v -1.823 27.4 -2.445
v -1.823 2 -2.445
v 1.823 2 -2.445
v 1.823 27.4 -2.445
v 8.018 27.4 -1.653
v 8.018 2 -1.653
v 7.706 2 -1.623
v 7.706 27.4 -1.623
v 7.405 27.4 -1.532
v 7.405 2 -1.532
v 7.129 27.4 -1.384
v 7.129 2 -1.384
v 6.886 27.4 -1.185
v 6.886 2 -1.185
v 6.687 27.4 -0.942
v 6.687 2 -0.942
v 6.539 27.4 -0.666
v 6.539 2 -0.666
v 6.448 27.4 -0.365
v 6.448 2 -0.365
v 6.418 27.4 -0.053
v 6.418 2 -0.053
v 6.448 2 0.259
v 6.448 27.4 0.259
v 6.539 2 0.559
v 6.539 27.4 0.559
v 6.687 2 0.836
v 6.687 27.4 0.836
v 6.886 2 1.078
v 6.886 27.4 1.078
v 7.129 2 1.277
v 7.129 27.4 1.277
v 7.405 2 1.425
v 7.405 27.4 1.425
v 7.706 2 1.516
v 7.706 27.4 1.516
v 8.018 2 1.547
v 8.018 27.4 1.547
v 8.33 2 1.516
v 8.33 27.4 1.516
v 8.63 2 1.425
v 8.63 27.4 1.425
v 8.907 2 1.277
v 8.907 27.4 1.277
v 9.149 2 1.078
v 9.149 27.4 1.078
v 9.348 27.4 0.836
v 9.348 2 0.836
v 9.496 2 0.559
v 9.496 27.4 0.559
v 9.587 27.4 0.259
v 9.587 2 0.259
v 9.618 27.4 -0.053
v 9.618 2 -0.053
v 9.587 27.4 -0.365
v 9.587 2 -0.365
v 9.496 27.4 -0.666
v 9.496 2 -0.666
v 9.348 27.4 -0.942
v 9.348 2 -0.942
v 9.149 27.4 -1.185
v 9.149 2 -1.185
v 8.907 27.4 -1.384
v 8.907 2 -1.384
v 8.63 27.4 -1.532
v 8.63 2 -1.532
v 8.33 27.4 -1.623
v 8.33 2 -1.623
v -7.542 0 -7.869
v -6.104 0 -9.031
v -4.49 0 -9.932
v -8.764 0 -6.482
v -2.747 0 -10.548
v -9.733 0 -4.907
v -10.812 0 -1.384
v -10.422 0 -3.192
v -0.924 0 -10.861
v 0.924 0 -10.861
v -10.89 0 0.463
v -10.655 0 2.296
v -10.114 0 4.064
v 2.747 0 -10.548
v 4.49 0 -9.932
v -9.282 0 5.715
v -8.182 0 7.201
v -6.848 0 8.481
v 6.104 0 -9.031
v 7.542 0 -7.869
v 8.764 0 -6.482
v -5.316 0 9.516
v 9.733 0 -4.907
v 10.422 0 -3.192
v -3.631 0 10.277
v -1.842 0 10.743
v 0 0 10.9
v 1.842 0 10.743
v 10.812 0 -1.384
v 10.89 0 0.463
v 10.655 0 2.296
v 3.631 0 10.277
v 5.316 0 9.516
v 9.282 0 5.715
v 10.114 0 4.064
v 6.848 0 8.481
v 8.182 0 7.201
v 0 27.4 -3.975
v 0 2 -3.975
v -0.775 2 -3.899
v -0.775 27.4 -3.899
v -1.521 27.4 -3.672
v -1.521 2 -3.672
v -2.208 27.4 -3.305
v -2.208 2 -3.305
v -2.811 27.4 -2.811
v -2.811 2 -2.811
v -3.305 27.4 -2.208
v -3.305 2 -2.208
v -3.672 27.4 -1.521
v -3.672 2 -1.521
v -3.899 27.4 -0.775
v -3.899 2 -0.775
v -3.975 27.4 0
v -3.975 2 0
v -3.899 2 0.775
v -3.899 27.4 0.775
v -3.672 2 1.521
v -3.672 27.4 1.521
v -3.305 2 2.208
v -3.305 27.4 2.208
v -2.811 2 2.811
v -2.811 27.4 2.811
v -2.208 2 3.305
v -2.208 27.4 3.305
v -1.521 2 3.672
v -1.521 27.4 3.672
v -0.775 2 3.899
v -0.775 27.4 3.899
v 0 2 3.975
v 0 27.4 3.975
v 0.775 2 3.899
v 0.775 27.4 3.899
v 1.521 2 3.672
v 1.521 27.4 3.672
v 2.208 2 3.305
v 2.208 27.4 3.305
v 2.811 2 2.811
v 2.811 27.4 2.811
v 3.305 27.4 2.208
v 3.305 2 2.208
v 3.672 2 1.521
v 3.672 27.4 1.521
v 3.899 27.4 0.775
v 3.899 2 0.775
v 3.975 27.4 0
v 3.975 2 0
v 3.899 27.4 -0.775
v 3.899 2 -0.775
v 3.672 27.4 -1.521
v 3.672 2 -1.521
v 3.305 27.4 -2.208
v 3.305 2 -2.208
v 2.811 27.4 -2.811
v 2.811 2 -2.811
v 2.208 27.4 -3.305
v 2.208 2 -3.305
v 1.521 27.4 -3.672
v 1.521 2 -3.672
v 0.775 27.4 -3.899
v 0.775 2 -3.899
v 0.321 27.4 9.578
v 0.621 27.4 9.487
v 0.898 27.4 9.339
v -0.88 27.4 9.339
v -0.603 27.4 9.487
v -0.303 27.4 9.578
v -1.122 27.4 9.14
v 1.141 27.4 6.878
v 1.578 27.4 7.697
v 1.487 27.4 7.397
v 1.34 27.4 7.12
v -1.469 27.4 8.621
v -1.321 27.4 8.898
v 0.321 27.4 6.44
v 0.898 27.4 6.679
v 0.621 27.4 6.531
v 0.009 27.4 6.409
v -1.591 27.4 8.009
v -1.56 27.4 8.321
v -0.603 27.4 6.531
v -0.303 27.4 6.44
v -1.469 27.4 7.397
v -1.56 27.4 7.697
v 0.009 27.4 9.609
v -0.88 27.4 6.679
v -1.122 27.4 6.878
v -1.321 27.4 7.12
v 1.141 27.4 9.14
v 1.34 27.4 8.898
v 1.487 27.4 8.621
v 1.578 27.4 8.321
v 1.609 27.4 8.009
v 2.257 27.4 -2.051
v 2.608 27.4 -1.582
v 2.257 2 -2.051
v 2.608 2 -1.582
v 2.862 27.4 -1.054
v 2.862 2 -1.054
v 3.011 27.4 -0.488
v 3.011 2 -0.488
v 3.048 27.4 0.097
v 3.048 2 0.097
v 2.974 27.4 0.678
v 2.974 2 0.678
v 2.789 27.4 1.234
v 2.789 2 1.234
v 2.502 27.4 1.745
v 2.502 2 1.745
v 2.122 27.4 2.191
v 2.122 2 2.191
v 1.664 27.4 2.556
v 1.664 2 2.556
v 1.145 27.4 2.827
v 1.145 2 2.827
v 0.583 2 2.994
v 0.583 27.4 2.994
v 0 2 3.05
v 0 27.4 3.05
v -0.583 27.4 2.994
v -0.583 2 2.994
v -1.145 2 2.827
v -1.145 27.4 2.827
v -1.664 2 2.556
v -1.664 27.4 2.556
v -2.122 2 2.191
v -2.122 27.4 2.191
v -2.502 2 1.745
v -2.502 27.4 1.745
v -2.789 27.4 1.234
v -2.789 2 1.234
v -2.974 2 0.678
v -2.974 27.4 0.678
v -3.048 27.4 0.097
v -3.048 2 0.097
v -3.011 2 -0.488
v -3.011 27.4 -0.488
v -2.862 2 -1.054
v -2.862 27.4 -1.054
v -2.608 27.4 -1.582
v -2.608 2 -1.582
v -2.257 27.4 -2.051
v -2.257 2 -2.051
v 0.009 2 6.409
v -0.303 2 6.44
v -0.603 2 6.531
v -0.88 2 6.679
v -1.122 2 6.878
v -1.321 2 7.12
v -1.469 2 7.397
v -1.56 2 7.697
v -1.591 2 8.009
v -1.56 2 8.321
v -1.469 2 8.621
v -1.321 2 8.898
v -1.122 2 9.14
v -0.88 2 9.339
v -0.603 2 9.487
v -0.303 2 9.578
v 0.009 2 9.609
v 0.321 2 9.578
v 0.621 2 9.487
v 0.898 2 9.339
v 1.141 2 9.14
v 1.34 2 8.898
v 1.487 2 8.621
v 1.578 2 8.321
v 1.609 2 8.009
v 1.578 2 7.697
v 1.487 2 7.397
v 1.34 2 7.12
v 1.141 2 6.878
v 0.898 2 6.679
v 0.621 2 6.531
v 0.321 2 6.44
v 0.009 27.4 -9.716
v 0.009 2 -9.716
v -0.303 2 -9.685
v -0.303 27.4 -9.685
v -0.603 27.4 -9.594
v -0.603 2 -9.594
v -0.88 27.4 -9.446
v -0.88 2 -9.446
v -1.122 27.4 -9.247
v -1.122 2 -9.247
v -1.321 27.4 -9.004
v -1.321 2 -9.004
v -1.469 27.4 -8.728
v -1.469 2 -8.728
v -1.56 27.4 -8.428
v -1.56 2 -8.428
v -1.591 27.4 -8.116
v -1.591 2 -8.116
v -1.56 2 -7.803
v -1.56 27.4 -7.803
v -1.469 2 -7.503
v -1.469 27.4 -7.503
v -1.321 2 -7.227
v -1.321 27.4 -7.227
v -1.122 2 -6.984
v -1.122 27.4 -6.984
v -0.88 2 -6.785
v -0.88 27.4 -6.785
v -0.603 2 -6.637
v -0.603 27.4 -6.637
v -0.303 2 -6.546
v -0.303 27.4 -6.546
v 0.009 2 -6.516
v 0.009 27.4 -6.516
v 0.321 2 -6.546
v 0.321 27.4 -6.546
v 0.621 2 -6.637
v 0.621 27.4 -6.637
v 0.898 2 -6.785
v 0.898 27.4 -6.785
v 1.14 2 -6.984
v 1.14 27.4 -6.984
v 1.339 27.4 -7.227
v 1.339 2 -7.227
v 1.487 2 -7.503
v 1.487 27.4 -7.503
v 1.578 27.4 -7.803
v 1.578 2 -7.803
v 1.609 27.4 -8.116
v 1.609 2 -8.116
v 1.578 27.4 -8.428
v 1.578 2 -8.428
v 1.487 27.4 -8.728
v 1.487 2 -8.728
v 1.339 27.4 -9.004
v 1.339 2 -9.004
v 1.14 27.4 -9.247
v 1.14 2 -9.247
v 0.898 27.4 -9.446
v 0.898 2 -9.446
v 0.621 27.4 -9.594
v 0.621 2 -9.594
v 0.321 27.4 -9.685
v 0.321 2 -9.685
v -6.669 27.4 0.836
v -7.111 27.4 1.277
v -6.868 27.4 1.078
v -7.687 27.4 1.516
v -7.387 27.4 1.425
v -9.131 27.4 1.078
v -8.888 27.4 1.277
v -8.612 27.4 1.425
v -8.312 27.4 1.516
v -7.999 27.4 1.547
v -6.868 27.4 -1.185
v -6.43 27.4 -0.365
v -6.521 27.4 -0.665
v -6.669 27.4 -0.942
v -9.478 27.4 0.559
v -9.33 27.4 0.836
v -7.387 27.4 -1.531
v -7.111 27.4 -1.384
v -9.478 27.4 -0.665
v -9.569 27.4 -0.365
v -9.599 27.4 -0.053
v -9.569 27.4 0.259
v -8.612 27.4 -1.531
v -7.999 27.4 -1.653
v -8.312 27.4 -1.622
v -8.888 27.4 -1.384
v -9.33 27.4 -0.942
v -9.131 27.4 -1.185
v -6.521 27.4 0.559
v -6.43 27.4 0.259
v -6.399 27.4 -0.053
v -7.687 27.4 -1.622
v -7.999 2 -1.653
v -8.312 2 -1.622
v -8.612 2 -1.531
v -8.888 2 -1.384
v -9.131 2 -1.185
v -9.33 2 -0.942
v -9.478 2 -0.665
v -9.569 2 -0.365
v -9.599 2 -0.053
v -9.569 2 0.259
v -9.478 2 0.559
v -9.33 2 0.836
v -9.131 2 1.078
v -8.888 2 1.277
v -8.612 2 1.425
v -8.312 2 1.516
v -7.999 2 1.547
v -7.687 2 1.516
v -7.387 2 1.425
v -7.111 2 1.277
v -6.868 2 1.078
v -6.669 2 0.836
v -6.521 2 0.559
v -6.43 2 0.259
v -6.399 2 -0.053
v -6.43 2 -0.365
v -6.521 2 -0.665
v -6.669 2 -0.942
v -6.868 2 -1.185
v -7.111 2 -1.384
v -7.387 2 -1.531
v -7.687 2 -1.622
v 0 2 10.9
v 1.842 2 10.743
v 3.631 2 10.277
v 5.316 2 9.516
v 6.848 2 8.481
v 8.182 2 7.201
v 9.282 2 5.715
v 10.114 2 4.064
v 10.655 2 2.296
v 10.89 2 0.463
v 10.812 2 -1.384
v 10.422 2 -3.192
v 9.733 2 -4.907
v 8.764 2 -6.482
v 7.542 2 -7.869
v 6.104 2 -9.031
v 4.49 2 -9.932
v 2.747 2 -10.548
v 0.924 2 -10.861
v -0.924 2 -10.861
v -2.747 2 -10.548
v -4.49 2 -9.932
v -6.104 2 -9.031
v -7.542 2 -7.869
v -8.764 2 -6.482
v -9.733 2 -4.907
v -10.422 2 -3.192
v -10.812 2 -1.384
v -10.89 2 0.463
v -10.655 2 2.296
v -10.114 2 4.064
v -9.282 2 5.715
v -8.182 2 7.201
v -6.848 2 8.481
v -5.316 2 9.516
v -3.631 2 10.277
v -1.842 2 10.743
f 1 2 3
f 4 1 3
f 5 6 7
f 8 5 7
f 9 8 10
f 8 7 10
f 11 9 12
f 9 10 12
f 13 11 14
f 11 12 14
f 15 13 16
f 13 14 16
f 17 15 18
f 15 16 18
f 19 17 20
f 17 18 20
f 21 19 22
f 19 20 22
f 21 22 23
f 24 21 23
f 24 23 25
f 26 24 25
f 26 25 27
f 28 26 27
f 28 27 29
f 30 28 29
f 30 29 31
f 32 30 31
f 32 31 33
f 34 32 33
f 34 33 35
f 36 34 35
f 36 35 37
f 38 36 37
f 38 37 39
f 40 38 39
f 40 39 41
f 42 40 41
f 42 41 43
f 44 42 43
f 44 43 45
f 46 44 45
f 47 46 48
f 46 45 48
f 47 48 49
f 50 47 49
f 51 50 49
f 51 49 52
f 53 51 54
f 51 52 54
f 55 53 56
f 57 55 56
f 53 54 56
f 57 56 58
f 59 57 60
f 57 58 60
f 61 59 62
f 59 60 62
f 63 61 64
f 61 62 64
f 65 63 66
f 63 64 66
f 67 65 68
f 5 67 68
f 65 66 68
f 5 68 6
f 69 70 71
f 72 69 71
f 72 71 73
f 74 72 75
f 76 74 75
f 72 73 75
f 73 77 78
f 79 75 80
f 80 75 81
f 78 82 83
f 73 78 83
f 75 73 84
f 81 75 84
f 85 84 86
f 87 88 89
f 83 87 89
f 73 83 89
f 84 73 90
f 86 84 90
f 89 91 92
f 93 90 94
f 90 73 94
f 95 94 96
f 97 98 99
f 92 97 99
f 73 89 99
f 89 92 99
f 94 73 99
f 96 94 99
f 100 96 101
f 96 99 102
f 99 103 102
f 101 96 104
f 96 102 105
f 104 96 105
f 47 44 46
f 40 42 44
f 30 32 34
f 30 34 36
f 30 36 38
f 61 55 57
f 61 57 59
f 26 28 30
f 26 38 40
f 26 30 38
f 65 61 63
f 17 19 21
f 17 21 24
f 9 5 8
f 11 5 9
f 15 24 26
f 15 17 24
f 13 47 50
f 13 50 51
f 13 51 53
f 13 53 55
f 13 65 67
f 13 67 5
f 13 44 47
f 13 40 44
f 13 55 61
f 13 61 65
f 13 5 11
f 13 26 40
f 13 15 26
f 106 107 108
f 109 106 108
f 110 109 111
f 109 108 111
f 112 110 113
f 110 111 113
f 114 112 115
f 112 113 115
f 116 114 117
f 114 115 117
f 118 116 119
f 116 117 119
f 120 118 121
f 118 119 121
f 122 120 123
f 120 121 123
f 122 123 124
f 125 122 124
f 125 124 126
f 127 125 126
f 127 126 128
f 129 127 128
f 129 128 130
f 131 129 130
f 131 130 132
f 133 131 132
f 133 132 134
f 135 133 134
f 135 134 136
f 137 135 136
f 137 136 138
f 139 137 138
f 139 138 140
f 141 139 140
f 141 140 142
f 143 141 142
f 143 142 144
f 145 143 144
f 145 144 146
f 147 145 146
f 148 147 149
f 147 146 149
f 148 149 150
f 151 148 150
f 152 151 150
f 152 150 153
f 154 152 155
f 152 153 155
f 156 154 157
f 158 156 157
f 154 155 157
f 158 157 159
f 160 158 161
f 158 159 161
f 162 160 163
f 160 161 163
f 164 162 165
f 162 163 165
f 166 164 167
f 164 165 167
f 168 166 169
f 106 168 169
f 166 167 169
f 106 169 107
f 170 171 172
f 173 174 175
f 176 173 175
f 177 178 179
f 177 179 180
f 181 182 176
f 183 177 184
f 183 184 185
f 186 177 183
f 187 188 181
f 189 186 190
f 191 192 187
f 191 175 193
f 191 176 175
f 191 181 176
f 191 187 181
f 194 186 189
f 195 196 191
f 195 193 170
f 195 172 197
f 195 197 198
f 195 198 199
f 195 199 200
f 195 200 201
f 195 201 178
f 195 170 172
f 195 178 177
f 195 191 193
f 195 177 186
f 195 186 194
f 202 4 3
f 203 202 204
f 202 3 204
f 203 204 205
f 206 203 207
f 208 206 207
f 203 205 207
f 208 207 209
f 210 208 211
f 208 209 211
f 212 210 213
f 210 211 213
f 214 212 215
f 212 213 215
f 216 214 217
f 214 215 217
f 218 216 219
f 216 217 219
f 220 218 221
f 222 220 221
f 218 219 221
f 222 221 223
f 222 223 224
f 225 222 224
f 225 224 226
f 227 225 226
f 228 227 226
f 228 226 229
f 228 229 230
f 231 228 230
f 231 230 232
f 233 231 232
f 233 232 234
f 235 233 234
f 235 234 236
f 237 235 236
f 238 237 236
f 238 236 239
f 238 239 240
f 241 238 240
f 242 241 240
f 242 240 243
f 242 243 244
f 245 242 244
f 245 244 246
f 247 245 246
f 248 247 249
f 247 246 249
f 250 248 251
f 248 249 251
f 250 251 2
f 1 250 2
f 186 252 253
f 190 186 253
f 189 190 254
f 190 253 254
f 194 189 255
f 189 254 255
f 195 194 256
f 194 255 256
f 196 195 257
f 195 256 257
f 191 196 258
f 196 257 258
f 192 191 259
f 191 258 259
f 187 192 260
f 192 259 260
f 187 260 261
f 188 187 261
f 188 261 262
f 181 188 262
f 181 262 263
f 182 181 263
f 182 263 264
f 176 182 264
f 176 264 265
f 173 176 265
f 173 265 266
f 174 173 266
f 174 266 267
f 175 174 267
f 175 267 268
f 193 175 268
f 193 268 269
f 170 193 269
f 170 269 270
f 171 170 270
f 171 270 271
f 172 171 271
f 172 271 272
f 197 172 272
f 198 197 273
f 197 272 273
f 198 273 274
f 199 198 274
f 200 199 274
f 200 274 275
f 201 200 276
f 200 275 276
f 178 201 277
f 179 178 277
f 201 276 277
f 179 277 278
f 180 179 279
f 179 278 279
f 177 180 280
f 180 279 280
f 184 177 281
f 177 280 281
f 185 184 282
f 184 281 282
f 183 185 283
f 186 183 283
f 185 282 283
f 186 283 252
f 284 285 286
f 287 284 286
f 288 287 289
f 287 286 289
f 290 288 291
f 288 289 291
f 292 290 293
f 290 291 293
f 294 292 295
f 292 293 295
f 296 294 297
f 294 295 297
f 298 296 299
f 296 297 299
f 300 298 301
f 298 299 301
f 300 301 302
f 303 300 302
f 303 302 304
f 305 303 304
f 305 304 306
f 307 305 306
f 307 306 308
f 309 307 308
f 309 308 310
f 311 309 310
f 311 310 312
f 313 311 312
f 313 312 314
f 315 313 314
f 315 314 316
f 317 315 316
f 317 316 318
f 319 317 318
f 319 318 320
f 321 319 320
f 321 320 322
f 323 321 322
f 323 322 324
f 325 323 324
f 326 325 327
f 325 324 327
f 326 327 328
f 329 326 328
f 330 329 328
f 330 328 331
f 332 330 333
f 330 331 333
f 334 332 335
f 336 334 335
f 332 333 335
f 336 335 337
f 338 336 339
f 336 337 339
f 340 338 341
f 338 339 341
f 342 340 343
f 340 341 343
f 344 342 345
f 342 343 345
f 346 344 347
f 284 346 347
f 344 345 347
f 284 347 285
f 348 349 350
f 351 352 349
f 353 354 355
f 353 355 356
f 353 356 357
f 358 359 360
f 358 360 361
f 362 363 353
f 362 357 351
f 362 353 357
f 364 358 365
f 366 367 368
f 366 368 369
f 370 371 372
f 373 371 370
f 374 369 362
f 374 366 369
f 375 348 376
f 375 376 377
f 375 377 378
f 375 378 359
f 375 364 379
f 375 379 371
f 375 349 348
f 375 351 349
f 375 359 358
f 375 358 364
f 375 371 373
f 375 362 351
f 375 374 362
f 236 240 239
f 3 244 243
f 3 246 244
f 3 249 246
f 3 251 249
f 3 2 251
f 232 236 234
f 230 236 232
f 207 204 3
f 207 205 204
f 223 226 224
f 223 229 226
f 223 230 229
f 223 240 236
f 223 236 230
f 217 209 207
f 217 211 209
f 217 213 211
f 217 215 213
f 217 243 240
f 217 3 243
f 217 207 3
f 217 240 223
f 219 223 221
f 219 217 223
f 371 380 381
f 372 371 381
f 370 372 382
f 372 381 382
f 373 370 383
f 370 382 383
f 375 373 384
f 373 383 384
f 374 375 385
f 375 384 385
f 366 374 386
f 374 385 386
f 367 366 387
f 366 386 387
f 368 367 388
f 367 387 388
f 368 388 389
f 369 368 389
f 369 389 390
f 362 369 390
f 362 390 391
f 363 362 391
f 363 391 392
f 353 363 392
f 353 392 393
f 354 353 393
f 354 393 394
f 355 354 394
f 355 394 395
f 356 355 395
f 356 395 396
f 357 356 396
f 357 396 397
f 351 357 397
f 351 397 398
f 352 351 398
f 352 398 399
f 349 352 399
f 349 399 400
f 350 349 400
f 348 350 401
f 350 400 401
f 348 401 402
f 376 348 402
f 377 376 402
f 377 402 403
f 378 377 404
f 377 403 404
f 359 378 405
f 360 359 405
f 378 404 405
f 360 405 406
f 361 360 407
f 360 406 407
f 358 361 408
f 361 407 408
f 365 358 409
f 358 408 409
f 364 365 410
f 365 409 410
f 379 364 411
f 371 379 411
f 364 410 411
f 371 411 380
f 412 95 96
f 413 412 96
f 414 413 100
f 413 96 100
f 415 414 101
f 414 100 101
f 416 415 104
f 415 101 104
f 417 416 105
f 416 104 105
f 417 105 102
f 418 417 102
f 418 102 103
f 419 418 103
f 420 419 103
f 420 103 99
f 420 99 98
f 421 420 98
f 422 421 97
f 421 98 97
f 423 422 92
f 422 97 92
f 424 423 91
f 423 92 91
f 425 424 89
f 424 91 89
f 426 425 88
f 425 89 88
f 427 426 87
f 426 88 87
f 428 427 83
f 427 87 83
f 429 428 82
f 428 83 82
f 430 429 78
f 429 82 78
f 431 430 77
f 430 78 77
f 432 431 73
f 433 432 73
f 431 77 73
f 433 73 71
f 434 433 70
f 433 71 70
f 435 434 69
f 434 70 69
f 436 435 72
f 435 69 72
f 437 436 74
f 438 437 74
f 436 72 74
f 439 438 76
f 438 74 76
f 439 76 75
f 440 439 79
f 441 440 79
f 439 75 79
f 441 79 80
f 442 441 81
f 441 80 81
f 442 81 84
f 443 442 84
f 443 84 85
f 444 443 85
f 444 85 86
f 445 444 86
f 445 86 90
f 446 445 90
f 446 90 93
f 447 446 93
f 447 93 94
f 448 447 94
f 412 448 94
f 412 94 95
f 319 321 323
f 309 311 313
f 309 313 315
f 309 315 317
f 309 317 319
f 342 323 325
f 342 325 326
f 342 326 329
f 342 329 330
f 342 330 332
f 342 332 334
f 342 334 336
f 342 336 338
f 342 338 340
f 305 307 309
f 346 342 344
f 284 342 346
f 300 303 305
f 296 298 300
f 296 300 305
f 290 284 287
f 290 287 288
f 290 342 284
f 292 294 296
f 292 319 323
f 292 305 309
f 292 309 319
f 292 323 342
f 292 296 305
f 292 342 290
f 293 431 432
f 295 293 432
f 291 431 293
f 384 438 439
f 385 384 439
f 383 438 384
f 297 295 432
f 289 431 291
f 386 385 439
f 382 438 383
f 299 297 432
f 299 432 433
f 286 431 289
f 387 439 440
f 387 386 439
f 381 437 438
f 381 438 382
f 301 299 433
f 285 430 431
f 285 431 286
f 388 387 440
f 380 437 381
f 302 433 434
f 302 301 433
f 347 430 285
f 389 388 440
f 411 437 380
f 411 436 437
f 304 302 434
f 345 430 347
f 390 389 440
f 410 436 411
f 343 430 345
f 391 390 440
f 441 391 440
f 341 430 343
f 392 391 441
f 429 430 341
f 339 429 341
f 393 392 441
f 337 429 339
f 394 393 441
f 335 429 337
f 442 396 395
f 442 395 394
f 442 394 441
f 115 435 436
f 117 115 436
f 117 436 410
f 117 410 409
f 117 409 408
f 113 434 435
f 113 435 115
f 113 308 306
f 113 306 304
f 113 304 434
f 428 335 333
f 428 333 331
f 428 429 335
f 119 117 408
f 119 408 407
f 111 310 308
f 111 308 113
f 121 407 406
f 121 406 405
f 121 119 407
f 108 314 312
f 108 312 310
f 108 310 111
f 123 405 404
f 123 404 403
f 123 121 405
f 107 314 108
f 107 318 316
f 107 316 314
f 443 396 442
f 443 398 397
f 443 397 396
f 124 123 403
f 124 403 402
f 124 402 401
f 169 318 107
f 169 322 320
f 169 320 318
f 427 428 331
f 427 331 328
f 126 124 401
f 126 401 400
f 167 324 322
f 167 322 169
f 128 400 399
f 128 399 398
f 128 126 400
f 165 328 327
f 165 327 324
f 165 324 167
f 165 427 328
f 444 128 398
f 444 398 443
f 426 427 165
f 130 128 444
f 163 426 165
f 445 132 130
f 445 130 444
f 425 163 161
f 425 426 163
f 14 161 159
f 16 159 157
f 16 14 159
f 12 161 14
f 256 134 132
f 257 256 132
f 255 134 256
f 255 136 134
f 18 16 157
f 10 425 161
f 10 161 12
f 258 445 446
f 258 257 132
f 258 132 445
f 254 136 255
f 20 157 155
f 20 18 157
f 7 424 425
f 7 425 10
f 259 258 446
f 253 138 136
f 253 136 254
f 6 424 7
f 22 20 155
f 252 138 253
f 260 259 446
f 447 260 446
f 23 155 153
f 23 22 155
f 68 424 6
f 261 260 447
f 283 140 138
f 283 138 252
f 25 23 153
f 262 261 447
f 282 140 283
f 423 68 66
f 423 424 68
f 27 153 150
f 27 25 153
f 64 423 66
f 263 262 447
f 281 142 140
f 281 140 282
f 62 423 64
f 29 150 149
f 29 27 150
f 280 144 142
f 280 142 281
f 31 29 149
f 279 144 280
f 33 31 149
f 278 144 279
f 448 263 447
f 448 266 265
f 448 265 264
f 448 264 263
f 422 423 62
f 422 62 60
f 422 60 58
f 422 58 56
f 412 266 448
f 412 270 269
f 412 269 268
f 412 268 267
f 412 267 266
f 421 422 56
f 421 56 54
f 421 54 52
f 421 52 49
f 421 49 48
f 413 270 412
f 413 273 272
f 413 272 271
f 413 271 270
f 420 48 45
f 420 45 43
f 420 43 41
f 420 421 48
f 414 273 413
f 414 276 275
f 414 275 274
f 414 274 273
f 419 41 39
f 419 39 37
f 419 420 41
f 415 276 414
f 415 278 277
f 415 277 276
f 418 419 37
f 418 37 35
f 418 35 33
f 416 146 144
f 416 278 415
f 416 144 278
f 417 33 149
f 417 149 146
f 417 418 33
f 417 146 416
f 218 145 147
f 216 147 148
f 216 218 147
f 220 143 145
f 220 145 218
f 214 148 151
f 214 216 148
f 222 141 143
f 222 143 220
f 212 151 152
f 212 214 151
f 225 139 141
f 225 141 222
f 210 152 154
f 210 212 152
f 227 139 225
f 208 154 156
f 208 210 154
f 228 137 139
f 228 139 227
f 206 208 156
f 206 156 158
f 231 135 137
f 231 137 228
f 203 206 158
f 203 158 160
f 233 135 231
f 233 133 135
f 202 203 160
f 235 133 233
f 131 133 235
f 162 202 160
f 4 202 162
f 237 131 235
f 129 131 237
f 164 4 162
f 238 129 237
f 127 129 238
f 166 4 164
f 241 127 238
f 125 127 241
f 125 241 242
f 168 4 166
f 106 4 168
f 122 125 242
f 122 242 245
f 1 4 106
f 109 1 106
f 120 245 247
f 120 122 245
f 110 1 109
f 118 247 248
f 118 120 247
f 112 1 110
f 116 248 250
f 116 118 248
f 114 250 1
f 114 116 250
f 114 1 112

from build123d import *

# Parameters (mm, degrees)
SKETCH3_R             = 1.6
BOSS_EXTRUDE1_DEPTH   = 27.4
BOSS_EXTRUDE1_2_DEPTH = 27.4
BOSS_EXTRUDE1_3_DEPTH = 27.4
BOSS_EXTRUDE1_4_DEPTH = 27.4
SKETCH3_R_2           = 3.975
BOSS_EXTRUDE1_5_DEPTH = 27.4
SKETCH3_17_R          = 10.9
BOSS_EXTRUDE2_DEPTH   = 2


with BuildPart() as part:
    # Sketch3 → Boss-Extrude1 (new body)
    with BuildSketch(Plane(origin=(0, 0, 0), x_dir=(1, 0, 0), z_dir=(0, 1, 0))):
        with Locations((0.009034474, 8.115584077)):
            Circle(SKETCH3_R)
    extrude(amount=BOSS_EXTRUDE1_DEPTH)



with BuildPart() as body_2:
    # Sketch3 → Boss-Extrude1 2 (new body)
    with BuildSketch(Plane(origin=(0, 0, 0), x_dir=(1, 0, 0), z_dir=(0, 1, 0))):
        with Locations((8.017679827, 0.053335715)):
            Circle(SKETCH3_R)
    extrude(amount=BOSS_EXTRUDE1_2_DEPTH)


with BuildPart() as body_3:
    # Sketch3 → Boss-Extrude1 3 (new body)
    with BuildSketch(Plane(origin=(0, 0, 0), x_dir=(1, 0, 0), z_dir=(0, 1, 0))):
        with Locations((0.009179949, -8.009057152)):
            Circle(SKETCH3_R)
    extrude(amount=BOSS_EXTRUDE1_3_DEPTH)


with BuildPart() as body_4:
    # Sketch3 → Boss-Extrude1 4 (new body)
    with BuildSketch(Plane(origin=(0, 0, 0), x_dir=(1, 0, 0), z_dir=(0, 1, 0))):
        with Locations((-7.999465404, 0.05319121)):
            Circle(SKETCH3_R)
    extrude(amount=BOSS_EXTRUDE1_4_DEPTH)


with BuildPart() as body_5:
    # Sketch3 → Boss-Extrude1 5 (new body)
    with BuildSketch(Plane(origin=(0, 0, 0), x_dir=(1, 0, 0), z_dir=(0, 1, 0))):
        Circle(SKETCH3_R_2)
        with BuildLine():
            Line((-1.823098343, 2.445161023), (1.823098343, 2.445161023))
            ThreePointArc((1.823098343, 2.445161023), (0, -3.05), (-1.823098343, 2.445161023))
        make_face(mode=Mode.SUBTRACT)
    extrude(amount=BOSS_EXTRUDE1_5_DEPTH)


with BuildPart() as part_1:
    add(part.part)

    add(body_2.part)  # Boss-Extrude2 merges body 2

    add(body_3.part)  # Boss-Extrude2 merges body 3

    add(body_4.part)  # Boss-Extrude2 merges body 4

    add(body_5.part)  # Boss-Extrude2 merges body 5
    # Sketch3<17> → Boss-Extrude2 (add)
    with BuildSketch(Plane(origin=(0, 0, 0), x_dir=(1, 0, 0), z_dir=(0, 1, 0))):
        Circle(SKETCH3_17_R)
    extrude(amount=BOSS_EXTRUDE2_DEPTH)


solid = part_1.part
